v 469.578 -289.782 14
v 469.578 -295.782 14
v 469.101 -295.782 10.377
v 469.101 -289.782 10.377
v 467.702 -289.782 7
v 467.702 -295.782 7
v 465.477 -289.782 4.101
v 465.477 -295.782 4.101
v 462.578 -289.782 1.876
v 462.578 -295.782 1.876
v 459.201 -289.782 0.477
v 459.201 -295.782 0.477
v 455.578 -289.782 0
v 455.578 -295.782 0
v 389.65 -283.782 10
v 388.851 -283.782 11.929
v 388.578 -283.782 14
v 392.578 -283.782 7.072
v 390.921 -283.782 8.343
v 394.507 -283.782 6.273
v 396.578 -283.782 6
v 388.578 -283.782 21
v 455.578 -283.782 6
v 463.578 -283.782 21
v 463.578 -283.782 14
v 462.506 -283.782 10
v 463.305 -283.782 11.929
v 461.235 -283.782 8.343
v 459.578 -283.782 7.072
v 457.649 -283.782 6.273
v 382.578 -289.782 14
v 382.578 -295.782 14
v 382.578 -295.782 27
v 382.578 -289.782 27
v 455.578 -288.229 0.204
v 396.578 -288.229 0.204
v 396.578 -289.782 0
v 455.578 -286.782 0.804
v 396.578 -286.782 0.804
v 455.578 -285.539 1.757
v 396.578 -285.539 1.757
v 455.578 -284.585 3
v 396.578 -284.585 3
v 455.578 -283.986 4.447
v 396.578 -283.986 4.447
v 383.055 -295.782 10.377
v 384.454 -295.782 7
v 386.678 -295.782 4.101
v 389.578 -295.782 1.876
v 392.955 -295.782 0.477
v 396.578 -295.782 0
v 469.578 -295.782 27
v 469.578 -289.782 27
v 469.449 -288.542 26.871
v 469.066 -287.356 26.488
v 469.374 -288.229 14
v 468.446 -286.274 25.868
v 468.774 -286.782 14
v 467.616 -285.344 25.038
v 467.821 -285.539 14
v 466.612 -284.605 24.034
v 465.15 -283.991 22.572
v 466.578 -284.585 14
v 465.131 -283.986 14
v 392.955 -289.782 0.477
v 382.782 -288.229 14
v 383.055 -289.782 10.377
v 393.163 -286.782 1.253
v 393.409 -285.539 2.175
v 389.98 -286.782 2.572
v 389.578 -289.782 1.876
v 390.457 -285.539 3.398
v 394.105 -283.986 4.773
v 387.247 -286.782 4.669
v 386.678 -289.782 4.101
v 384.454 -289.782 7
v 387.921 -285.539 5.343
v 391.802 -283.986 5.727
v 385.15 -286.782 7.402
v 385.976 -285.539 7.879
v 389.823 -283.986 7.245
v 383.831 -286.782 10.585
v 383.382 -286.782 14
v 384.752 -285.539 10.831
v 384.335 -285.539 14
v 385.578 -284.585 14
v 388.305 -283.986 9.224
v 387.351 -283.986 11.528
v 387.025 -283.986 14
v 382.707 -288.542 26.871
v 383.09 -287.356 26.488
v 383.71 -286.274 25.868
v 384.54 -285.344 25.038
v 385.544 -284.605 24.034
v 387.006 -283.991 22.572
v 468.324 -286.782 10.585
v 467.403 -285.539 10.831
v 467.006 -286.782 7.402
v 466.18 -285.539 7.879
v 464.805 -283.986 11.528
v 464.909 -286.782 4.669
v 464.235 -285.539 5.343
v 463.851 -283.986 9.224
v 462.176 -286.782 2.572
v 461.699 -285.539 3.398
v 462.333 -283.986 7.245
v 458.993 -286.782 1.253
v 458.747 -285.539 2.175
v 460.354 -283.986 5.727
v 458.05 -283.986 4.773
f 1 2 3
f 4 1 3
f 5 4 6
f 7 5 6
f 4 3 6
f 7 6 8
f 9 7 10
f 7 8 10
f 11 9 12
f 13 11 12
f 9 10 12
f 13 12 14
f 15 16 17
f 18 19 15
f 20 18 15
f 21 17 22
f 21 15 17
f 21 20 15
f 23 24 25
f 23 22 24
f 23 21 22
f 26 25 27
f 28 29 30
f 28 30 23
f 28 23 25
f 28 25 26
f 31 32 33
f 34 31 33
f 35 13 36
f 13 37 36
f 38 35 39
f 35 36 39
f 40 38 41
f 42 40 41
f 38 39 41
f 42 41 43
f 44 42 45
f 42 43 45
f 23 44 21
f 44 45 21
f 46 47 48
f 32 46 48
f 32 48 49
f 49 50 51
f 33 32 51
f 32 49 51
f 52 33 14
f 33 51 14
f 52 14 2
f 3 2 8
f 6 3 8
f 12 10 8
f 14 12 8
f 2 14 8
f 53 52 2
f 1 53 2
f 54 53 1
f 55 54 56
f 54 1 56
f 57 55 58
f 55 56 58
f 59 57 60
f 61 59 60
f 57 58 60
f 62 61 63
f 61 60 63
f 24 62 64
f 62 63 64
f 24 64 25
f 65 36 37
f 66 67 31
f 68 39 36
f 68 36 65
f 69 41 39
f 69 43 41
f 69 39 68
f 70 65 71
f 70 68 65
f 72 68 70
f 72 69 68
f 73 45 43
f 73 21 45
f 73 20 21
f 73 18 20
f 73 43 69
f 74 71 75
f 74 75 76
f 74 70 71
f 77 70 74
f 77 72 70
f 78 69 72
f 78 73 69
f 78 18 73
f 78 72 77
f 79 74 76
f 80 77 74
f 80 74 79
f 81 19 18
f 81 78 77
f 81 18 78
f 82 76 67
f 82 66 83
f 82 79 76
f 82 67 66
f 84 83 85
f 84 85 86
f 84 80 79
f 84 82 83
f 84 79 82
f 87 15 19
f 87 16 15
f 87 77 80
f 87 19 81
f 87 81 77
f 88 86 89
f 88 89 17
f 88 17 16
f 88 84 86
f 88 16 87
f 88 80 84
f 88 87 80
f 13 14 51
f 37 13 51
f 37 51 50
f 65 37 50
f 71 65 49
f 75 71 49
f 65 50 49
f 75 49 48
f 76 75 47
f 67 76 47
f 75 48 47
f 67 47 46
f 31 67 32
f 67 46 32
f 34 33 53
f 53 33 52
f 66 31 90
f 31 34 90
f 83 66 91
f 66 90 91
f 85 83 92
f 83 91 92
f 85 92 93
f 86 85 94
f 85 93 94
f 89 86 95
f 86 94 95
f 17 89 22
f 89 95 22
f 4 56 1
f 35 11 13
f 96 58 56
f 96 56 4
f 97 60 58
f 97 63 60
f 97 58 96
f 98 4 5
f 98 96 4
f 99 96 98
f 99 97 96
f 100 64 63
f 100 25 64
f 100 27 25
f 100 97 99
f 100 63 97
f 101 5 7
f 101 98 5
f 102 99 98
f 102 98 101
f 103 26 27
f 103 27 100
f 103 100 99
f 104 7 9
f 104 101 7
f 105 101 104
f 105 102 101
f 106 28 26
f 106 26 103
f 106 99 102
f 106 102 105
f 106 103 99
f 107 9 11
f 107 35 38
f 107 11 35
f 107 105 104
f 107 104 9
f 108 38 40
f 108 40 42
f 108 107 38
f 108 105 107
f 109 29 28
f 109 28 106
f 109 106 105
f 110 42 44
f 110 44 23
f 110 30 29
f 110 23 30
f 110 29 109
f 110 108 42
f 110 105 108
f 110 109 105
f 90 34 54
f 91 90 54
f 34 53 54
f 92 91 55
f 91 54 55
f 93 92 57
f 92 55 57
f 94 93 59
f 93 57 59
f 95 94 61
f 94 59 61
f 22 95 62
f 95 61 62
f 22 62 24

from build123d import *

# Parameters (mm, degrees)
BOSS_EXTRUDE1_DEPTH = 12
FILLET2_R           = 6


with BuildPart() as part:
    # Sketch1 → Boss-Extrude1 (new body)
    with BuildSketch(Plane(origin=(0, -295.781515915, 0), x_dir=(1, 0, 0), z_dir=(0, 1, 0))):
        with BuildLine():
            Line((469.577970857, -27), (469.577970857, -14))
            ThreePointArc((469.577970857, -14), (465.477465793, -4.100505063), (455.577970857, 0))
            Line((455.577970857, 0), (396.577970857, 0))
            ThreePointArc((396.577970857, 0), (386.67847592, -4.100505063), (382.577970857, -14))
            Line((382.577970857, -14), (382.577970857, -27))
            Line((382.577970857, -27), (469.577970857, -27))
        make_face()
    extrude(amount=BOSS_EXTRUDE1_DEPTH)

    # Fillet2
    fillet2_edges = [part.edges().sort_by_distance(p)[0] for p in [
        (465.477465793, -283.781515915, 4.100505063),
        (426.077970857, -283.781515915, 0),
        (386.67847592, -283.781515915, 4.100505063),
        (382.577970857, -283.781515915, 20.5),
        (426.077970857, -283.781515915, 27),
        (469.577970857, -283.781515915, 20.5),
    ]]
    fillet(fillet2_edges, radius=FILLET2_R)


solid = part.part
